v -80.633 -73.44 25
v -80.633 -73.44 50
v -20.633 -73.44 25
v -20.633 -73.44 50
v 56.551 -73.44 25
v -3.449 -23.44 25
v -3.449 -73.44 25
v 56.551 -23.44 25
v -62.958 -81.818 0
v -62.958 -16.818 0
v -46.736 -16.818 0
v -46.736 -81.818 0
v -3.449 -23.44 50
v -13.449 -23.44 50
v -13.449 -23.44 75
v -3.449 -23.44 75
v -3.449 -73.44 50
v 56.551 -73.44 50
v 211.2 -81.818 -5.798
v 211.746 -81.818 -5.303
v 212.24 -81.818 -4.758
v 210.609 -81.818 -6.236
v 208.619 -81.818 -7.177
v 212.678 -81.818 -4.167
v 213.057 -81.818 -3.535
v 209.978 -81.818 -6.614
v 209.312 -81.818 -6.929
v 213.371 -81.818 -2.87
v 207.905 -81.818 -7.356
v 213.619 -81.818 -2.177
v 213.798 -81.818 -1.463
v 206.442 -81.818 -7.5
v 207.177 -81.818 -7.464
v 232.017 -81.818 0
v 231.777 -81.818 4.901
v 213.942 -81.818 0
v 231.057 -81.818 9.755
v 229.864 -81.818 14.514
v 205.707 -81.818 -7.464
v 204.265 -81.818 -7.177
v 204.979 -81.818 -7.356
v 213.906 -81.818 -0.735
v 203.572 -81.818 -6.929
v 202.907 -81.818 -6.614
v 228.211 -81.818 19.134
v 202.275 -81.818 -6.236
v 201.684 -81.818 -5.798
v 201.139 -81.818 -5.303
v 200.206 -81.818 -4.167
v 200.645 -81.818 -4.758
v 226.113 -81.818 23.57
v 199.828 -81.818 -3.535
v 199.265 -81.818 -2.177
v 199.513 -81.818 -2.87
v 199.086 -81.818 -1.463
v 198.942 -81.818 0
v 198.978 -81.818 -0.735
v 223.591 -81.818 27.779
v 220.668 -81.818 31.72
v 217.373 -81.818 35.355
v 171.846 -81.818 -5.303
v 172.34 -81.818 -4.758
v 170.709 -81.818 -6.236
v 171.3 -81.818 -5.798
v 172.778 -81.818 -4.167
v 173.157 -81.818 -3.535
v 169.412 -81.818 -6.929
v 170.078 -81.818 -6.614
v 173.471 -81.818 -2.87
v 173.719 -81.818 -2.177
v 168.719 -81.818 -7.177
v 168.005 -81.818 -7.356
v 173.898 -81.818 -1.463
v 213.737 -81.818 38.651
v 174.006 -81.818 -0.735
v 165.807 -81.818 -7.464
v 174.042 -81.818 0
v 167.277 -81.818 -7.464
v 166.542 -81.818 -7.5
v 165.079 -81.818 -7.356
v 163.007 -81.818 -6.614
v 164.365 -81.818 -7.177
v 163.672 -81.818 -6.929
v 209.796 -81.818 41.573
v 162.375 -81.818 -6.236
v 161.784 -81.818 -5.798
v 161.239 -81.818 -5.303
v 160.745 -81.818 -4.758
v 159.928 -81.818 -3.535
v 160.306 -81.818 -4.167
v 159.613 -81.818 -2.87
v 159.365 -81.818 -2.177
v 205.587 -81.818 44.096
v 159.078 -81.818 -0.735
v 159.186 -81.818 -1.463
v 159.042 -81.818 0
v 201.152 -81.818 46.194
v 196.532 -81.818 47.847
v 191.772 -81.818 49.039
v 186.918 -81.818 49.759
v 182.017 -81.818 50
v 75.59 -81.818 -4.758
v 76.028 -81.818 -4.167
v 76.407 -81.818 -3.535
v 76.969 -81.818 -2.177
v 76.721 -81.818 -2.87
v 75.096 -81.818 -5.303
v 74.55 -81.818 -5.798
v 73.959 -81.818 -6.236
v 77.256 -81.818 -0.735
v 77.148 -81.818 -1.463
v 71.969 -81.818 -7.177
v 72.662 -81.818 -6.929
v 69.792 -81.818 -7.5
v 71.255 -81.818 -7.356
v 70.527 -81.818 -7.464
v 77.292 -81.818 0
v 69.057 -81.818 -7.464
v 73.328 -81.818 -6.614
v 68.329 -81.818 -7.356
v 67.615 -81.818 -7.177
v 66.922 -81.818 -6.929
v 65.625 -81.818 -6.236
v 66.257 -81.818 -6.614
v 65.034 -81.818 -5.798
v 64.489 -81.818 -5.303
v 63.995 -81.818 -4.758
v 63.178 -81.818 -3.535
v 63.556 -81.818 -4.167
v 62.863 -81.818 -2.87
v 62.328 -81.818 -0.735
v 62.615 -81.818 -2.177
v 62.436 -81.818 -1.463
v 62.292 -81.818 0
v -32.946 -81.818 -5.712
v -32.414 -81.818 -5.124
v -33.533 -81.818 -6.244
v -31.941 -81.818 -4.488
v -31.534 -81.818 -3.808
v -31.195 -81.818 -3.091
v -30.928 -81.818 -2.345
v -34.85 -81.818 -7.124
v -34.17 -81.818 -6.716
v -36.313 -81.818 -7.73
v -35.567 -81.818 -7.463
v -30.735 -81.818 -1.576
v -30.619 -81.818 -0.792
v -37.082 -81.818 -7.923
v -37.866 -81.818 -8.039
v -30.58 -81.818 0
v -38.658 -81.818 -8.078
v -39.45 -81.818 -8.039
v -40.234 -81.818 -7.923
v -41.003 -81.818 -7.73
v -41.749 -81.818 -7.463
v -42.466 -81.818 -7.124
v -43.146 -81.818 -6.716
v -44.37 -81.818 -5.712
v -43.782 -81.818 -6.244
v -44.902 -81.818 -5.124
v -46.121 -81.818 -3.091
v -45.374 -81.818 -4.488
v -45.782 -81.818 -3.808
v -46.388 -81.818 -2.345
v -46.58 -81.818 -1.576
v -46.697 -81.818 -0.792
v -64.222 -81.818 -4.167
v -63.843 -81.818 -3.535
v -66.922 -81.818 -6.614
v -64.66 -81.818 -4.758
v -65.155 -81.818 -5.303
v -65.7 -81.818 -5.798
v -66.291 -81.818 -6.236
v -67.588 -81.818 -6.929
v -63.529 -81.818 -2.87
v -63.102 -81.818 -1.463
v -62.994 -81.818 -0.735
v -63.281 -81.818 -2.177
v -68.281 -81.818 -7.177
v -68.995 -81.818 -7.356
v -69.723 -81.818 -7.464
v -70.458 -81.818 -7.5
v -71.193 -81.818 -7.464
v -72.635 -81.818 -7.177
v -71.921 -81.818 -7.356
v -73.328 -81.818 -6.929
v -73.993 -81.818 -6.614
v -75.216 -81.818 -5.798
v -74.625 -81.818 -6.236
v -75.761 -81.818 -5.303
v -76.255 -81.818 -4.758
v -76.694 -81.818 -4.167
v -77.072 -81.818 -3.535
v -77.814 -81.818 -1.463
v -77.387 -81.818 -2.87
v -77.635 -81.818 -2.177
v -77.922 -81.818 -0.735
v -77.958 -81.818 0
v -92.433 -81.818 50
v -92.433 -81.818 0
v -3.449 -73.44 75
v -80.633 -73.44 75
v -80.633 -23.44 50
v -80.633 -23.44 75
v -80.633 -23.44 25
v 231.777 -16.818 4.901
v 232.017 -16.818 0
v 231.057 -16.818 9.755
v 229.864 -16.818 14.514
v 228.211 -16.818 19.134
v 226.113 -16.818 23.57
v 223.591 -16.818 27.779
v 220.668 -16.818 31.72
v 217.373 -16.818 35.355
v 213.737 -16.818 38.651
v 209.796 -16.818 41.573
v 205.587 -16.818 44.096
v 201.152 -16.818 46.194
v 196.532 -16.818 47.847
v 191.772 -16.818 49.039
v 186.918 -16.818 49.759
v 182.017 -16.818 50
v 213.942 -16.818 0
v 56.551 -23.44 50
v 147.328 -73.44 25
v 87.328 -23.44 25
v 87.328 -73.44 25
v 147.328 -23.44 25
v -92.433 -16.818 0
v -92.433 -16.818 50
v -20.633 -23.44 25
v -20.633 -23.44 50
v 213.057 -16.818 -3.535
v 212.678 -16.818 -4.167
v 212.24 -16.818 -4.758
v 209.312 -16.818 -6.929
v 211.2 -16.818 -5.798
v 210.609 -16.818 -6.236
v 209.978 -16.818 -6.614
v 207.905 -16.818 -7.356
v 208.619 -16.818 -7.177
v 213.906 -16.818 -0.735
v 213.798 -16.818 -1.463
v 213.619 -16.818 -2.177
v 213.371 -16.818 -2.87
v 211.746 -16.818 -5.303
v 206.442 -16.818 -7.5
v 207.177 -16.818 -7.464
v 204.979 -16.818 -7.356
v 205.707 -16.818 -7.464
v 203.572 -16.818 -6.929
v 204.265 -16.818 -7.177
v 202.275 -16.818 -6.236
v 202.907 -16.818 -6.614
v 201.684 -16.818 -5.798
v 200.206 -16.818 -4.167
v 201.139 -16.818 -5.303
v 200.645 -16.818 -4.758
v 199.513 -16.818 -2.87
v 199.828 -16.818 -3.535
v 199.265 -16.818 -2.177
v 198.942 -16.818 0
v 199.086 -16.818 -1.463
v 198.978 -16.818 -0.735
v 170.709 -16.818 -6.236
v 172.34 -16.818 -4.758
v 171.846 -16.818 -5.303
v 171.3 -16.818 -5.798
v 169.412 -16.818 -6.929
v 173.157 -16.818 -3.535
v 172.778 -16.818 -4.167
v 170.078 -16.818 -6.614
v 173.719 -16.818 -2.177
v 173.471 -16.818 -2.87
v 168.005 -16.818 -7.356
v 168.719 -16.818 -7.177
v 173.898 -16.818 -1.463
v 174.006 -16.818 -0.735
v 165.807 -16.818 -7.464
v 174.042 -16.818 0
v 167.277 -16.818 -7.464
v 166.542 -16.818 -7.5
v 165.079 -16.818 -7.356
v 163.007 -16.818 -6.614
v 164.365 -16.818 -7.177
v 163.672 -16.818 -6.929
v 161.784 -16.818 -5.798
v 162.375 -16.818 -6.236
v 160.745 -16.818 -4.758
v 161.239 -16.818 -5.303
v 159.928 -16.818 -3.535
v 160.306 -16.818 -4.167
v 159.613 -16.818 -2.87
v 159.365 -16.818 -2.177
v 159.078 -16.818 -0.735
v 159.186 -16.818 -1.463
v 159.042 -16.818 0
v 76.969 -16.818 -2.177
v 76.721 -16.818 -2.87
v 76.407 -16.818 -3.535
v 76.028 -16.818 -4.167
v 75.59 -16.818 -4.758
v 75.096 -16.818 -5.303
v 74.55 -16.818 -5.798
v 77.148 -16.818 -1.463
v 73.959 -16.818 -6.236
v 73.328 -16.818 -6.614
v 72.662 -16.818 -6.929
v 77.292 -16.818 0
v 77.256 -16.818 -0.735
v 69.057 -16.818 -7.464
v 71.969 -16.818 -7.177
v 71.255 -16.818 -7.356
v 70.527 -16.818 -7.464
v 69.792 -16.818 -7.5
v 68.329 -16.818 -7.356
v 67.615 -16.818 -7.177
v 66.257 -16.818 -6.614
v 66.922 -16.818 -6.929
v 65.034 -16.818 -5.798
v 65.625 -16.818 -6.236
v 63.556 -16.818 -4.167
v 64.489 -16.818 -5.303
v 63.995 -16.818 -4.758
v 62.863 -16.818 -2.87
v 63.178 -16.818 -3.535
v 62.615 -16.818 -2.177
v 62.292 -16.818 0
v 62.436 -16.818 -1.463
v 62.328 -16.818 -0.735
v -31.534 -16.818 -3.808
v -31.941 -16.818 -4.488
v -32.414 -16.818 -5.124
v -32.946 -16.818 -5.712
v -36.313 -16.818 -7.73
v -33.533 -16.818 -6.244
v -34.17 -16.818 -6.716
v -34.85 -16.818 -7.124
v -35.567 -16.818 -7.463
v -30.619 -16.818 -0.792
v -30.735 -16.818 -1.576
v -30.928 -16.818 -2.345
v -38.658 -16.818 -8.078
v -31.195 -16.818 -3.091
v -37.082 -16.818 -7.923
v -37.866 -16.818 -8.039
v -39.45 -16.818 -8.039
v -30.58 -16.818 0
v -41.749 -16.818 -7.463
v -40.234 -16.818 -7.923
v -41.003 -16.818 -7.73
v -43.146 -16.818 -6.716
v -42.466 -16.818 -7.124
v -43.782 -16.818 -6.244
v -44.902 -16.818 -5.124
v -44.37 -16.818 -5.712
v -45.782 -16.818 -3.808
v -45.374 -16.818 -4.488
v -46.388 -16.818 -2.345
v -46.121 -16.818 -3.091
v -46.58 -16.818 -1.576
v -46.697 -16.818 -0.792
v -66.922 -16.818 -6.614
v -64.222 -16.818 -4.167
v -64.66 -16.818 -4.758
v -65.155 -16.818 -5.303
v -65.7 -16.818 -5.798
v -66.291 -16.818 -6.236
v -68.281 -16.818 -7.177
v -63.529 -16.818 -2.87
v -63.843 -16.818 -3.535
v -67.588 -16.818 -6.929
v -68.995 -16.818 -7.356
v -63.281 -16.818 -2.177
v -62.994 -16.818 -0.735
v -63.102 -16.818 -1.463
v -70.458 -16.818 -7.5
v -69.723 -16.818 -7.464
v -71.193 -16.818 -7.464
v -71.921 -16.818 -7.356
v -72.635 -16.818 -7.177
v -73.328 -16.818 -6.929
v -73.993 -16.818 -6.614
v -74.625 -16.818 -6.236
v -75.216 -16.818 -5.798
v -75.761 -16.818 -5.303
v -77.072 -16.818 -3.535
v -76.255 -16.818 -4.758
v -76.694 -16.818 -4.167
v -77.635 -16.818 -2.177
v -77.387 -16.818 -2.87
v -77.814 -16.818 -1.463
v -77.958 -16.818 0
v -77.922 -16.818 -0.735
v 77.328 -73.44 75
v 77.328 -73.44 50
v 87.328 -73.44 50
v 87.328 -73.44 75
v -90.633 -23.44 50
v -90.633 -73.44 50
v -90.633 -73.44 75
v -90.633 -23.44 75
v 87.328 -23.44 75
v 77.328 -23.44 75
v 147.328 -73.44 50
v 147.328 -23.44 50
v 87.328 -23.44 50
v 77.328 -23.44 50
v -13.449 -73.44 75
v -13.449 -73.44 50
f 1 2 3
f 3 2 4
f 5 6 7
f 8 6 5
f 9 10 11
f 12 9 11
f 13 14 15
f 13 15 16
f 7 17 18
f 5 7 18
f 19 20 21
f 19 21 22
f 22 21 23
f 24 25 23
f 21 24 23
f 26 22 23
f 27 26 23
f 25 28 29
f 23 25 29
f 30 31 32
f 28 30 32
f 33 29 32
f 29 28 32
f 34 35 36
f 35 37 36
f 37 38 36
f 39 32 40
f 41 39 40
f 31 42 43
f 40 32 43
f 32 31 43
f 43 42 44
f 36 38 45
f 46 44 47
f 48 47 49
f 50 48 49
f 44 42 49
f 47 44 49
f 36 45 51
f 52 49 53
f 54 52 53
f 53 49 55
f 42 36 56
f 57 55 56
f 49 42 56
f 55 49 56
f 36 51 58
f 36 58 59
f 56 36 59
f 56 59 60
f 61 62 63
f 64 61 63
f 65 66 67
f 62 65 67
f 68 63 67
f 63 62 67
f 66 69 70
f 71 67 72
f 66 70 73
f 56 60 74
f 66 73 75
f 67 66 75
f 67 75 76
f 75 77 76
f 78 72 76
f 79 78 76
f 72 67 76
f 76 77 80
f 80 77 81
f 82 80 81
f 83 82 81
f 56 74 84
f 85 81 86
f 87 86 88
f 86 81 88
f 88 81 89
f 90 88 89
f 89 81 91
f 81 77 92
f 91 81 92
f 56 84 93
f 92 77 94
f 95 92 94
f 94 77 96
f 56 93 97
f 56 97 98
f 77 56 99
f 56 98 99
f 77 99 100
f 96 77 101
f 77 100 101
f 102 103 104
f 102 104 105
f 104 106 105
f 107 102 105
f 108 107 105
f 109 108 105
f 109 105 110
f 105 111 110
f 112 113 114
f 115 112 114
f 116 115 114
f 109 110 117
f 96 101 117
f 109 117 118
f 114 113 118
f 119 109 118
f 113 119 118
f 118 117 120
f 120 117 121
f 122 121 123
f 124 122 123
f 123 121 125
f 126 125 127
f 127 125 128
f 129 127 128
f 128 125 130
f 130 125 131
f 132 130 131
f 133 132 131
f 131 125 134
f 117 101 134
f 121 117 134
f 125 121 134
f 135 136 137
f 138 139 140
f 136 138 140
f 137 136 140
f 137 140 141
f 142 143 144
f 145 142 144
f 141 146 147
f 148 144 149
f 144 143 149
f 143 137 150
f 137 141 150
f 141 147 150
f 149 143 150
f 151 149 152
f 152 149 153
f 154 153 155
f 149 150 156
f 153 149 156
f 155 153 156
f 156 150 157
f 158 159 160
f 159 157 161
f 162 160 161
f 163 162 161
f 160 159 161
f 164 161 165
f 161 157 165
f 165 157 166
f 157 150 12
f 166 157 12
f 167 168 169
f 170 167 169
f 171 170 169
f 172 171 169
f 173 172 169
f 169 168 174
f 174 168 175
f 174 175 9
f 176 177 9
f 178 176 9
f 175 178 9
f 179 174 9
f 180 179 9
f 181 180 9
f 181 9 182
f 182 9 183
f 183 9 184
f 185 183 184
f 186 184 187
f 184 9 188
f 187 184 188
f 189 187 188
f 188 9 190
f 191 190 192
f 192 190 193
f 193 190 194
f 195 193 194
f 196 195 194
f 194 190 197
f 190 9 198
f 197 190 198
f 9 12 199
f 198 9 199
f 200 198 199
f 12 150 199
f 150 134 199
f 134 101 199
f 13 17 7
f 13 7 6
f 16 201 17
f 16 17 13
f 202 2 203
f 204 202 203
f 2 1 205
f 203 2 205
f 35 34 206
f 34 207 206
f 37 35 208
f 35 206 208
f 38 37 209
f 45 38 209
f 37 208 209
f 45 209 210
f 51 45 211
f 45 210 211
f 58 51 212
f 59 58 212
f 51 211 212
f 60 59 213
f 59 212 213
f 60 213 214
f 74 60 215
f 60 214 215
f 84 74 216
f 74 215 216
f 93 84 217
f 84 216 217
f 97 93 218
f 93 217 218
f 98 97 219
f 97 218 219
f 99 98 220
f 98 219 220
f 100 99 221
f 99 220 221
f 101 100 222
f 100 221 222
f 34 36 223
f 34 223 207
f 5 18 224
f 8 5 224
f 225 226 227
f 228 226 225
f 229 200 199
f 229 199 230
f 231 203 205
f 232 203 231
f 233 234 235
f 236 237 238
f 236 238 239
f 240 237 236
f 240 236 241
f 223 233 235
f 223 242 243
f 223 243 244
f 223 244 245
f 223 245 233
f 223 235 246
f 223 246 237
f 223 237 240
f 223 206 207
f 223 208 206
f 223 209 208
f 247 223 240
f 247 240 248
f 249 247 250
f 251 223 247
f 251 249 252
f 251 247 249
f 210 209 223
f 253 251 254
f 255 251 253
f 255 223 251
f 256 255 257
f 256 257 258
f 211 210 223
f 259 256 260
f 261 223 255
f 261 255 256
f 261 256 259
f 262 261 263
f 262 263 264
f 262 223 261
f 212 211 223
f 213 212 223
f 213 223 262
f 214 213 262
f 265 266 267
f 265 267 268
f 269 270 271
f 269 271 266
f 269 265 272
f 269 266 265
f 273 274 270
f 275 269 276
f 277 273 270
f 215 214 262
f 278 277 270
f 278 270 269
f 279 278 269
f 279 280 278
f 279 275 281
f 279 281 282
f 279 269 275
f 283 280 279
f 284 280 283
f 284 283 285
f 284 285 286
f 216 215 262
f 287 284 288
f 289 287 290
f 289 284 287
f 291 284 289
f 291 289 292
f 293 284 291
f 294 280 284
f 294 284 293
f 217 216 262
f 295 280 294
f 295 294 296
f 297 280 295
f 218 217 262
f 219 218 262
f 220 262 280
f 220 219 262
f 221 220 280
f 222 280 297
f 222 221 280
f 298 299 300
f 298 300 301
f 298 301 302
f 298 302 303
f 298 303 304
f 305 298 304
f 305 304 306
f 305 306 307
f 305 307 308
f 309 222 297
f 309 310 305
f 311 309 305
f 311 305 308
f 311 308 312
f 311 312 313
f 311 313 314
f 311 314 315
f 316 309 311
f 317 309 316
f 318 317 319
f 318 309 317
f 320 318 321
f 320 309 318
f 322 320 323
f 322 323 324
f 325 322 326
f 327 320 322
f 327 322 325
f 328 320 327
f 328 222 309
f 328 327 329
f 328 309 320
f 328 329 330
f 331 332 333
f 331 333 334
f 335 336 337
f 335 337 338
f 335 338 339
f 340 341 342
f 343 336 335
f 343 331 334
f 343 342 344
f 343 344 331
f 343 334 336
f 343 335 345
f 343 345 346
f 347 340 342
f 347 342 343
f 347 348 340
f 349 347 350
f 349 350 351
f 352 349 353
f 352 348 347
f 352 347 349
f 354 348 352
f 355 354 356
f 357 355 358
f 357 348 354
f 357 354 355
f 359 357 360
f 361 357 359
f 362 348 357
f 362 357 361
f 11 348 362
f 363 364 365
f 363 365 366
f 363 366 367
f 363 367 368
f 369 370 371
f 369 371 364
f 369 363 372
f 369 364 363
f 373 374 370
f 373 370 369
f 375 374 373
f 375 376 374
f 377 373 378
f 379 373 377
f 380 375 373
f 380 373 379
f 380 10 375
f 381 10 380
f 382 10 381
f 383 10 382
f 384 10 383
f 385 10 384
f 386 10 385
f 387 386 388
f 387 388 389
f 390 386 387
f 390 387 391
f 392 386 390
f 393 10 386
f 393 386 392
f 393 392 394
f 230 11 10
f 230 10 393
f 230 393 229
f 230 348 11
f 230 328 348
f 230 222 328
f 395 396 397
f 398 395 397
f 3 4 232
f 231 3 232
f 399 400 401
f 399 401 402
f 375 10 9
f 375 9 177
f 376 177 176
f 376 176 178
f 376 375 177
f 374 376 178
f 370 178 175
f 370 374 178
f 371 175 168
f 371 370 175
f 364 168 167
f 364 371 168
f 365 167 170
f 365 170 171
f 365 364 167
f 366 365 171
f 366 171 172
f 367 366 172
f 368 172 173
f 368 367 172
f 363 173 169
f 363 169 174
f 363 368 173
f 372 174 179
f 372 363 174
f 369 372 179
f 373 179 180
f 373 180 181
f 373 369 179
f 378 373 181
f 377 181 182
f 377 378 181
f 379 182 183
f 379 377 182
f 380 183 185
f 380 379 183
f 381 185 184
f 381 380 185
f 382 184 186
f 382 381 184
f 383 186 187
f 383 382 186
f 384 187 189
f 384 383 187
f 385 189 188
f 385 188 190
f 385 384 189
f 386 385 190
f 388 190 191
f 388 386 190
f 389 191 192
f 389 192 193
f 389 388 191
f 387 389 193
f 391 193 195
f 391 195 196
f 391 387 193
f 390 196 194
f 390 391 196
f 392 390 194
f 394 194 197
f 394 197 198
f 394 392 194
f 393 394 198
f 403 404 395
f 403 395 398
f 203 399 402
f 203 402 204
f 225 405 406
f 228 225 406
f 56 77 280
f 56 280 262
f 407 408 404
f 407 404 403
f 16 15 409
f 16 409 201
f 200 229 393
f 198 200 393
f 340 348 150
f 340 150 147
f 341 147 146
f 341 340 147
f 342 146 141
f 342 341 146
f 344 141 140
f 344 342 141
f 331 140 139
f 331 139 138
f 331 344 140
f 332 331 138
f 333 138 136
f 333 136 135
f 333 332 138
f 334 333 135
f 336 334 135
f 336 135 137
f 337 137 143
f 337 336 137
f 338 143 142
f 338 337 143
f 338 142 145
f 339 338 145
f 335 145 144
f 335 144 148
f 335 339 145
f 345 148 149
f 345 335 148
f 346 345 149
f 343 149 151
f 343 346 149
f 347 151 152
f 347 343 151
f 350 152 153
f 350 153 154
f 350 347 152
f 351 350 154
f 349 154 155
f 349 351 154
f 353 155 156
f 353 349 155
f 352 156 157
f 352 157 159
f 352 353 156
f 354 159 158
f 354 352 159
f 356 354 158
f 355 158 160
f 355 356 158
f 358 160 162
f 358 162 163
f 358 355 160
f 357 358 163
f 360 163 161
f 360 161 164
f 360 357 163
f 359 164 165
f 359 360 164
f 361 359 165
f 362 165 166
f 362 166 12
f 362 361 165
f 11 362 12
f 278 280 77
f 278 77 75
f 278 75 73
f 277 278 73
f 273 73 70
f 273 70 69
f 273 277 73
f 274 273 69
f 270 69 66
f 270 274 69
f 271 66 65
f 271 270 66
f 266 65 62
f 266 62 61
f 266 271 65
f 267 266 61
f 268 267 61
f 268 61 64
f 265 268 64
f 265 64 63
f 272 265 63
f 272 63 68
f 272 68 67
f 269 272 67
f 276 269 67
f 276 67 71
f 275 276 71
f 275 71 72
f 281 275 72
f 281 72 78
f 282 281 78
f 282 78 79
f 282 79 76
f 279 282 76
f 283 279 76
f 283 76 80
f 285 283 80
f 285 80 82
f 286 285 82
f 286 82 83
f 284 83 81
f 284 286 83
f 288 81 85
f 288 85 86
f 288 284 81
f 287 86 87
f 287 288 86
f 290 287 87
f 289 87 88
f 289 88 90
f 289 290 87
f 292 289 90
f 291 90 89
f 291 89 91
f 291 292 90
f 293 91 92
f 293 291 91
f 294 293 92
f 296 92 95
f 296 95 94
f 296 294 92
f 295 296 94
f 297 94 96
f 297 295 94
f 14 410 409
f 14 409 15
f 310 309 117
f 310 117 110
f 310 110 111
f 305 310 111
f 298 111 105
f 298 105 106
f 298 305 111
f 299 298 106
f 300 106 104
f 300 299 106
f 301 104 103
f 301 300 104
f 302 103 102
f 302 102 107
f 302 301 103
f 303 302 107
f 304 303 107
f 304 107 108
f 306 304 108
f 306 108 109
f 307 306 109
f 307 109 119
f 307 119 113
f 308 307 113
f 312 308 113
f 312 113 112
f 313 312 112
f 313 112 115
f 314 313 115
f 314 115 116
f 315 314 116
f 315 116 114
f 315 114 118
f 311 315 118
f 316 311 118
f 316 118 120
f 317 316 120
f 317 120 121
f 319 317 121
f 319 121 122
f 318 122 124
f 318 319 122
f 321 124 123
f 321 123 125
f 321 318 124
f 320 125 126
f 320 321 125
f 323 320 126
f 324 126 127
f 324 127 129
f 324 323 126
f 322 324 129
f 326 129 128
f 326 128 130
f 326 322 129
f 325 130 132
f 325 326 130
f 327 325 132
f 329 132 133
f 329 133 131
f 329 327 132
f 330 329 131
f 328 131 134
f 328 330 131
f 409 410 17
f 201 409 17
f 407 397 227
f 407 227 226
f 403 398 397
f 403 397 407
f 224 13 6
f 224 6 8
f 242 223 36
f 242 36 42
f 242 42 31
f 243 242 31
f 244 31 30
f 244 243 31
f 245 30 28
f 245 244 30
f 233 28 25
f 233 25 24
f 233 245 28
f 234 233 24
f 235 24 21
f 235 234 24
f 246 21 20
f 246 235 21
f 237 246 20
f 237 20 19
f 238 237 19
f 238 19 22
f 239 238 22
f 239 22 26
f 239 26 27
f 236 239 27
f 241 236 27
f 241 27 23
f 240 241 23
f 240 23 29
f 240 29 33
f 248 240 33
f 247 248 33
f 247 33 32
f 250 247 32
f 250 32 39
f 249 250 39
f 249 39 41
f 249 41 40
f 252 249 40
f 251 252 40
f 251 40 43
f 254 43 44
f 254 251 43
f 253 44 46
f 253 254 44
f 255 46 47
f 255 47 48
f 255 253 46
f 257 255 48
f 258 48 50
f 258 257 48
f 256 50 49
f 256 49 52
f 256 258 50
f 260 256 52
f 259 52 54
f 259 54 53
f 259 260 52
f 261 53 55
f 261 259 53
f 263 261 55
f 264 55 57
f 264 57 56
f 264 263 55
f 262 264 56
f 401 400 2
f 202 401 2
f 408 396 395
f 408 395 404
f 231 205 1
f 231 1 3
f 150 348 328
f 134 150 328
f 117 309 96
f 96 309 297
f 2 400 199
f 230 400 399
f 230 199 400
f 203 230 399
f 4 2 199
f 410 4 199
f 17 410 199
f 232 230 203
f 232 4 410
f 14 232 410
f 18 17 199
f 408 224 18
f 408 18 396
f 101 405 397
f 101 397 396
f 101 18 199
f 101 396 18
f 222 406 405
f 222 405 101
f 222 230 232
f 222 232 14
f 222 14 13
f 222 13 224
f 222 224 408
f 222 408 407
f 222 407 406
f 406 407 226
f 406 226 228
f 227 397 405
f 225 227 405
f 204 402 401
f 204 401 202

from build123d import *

# Parameters (mm, degrees)
F0_W      = 324.4502871967
F0_H      = 65
F1_DEPTH  = 50
F2_R      = 49.99999
F3_W      = 60
F3_H      = 50
F4_DEPTH  = 25
F6_DEPTH  = 65
F8_DEPTH  = 65
F9_W      = 10
F9_H      = 50
F10_DEPTH = 25


# Not quite as in the source:
# - a fillet or chamfer is up to 0.001 mm smaller than in the source, because OpenCascade refuses the exact size


with BuildPart() as f1:
    # F0 (on Top) → F1 (new body)
    with BuildSketch(Plane.XY):
        with Locations((69.7921998799, -49.3180742487)):
            Rectangle(F0_W, F0_H)
    extrude(amount=F1_DEPTH)

    # F2 (radius 50 in the source; OpenCascade refuses exactly that, so slightly less here)
    f2_edges = [f1.edges().sort_by_distance(p)[0] for p in [
        (232.017343, -49.318074, 50),
    ]]
    fillet(f2_edges, radius=F2_R)

    # F3 (on face) → F4 (cut)
    with BuildSketch(Plane.XY.offset(50)):
        with Locations((-50.6331702159, -48.4395725653)):
            Rectangle(F3_W, F3_H)
        with Locations((26.5513133067, -48.4395725653)):
            Rectangle(F3_W, F3_H)
        with Locations((117.3280163615, -48.4395725653)):
            Rectangle(F3_W, F3_H)
    extrude(amount=-F4_DEPTH, mode=Mode.SUBTRACT)

    # F5 (on face) → F6 (cut)
    with BuildSketch(Plane.XZ.offset(81.8180742487)):
        with BuildLine():
            ThreePointArc((211.8422013521, 0), (204.3422013521, 7.5), (196.8422013521, 0))
            Line((196.8422013521, 0), (211.8422013521, 0))
        make_face()
        with BuildLine():
            ThreePointArc((165.3422039747, 0), (157.8422039747, 7.5), (150.3422039747, 0))
            Line((150.3422039747, 0), (165.3422039747, 0))
        make_face()
        with BuildLine():
            ThreePointArc((-22.1578053385, 0), (-29.6578053385, 7.5), (-37.1578053385, 0))
            Line((-37.1578053385, 0), (-22.1578053385, 0))
        make_face()
        with BuildLine():
            Line((-85.1578038931, 0), (-70.1578038931, 0))
            ThreePointArc((-70.1578038931, 0), (-77.6578038931, 7.5), (-85.1578038931, 0))
        make_face()
    extrude(amount=F6_DEPTH, mode=Mode.SUBTRACT)

    # F7 (on face) → F8 (join)
    with BuildSketch(Plane(origin=(0, -16.8180742487, 0), x_dir=(-1, 0, 0), z_dir=(0, 1, 0))):
        with BuildLine():
            Line((-213.942207098, 0), (-198.942207098, 0))
            ThreePointArc((-198.942207098, 0), (-206.442207098, 7.5), (-213.942207098, 0))
        make_face()
        with BuildLine():
            ThreePointArc((-213.942207098, 0), (-206.442207098, -7.5), (-198.942207098, 0))
            Line((-198.942207098, 0), (-213.942207098, 0))
        make_face()
        with BuildLine():
            Line((-159.0422022343, 0), (-174.0422022343, 0))
            ThreePointArc((-174.0422022343, 0), (-166.5422022343, -7.5), (-159.0422022343, 0))
        make_face()
        with BuildLine():
            ThreePointArc((-159.0422022343, 0), (-166.5422022343, 7.5), (-174.0422022343, 0))
            Line((-174.0422022343, 0), (-159.0422022343, 0))
        make_face()
        with BuildLine():
            Line((-62.2921998799, 0), (-77.2921998799, 0))
            ThreePointArc((-77.2921998799, 0), (-69.7921998799, -7.5), (-62.2921998799, 0))
        make_face()
        with BuildLine():
            ThreePointArc((-62.2921998799, 0), (-69.7921998799, 7.5), (-77.2921998799, 0))
            Line((-77.2921998799, 0), (-62.2921998799, 0))
        make_face()
        with BuildLine():
            Line((46.7355581226, 0), (30.5800629554, 0))
            ThreePointArc((30.5800629554, 0), (38.657810539, -8.0777475836), (46.7355581226, 0))
        make_face()
        with BuildLine():
            ThreePointArc((62.9578086734, 0), (70.4578086734, -7.5), (77.9578086734, 0))
            Line((77.9578086734, 0), (62.9578086734, 0))
        make_face()
    extrude(amount=-F8_DEPTH)

    # F9 (on face) → F10 (join)
    with BuildSketch(Plane.XY.offset(50)):
        with Locations((-85.6331702159, -48.4395725653)):
            Rectangle(F9_W, F9_H)
        with Locations((-8.4486866933, -48.4395725653)):
            Rectangle(F9_W, F9_H)
        with Locations((82.3280163615, -48.4395725653)):
            Rectangle(F9_W, F9_H)
    extrude(amount=F10_DEPTH)


solid = f1.part
